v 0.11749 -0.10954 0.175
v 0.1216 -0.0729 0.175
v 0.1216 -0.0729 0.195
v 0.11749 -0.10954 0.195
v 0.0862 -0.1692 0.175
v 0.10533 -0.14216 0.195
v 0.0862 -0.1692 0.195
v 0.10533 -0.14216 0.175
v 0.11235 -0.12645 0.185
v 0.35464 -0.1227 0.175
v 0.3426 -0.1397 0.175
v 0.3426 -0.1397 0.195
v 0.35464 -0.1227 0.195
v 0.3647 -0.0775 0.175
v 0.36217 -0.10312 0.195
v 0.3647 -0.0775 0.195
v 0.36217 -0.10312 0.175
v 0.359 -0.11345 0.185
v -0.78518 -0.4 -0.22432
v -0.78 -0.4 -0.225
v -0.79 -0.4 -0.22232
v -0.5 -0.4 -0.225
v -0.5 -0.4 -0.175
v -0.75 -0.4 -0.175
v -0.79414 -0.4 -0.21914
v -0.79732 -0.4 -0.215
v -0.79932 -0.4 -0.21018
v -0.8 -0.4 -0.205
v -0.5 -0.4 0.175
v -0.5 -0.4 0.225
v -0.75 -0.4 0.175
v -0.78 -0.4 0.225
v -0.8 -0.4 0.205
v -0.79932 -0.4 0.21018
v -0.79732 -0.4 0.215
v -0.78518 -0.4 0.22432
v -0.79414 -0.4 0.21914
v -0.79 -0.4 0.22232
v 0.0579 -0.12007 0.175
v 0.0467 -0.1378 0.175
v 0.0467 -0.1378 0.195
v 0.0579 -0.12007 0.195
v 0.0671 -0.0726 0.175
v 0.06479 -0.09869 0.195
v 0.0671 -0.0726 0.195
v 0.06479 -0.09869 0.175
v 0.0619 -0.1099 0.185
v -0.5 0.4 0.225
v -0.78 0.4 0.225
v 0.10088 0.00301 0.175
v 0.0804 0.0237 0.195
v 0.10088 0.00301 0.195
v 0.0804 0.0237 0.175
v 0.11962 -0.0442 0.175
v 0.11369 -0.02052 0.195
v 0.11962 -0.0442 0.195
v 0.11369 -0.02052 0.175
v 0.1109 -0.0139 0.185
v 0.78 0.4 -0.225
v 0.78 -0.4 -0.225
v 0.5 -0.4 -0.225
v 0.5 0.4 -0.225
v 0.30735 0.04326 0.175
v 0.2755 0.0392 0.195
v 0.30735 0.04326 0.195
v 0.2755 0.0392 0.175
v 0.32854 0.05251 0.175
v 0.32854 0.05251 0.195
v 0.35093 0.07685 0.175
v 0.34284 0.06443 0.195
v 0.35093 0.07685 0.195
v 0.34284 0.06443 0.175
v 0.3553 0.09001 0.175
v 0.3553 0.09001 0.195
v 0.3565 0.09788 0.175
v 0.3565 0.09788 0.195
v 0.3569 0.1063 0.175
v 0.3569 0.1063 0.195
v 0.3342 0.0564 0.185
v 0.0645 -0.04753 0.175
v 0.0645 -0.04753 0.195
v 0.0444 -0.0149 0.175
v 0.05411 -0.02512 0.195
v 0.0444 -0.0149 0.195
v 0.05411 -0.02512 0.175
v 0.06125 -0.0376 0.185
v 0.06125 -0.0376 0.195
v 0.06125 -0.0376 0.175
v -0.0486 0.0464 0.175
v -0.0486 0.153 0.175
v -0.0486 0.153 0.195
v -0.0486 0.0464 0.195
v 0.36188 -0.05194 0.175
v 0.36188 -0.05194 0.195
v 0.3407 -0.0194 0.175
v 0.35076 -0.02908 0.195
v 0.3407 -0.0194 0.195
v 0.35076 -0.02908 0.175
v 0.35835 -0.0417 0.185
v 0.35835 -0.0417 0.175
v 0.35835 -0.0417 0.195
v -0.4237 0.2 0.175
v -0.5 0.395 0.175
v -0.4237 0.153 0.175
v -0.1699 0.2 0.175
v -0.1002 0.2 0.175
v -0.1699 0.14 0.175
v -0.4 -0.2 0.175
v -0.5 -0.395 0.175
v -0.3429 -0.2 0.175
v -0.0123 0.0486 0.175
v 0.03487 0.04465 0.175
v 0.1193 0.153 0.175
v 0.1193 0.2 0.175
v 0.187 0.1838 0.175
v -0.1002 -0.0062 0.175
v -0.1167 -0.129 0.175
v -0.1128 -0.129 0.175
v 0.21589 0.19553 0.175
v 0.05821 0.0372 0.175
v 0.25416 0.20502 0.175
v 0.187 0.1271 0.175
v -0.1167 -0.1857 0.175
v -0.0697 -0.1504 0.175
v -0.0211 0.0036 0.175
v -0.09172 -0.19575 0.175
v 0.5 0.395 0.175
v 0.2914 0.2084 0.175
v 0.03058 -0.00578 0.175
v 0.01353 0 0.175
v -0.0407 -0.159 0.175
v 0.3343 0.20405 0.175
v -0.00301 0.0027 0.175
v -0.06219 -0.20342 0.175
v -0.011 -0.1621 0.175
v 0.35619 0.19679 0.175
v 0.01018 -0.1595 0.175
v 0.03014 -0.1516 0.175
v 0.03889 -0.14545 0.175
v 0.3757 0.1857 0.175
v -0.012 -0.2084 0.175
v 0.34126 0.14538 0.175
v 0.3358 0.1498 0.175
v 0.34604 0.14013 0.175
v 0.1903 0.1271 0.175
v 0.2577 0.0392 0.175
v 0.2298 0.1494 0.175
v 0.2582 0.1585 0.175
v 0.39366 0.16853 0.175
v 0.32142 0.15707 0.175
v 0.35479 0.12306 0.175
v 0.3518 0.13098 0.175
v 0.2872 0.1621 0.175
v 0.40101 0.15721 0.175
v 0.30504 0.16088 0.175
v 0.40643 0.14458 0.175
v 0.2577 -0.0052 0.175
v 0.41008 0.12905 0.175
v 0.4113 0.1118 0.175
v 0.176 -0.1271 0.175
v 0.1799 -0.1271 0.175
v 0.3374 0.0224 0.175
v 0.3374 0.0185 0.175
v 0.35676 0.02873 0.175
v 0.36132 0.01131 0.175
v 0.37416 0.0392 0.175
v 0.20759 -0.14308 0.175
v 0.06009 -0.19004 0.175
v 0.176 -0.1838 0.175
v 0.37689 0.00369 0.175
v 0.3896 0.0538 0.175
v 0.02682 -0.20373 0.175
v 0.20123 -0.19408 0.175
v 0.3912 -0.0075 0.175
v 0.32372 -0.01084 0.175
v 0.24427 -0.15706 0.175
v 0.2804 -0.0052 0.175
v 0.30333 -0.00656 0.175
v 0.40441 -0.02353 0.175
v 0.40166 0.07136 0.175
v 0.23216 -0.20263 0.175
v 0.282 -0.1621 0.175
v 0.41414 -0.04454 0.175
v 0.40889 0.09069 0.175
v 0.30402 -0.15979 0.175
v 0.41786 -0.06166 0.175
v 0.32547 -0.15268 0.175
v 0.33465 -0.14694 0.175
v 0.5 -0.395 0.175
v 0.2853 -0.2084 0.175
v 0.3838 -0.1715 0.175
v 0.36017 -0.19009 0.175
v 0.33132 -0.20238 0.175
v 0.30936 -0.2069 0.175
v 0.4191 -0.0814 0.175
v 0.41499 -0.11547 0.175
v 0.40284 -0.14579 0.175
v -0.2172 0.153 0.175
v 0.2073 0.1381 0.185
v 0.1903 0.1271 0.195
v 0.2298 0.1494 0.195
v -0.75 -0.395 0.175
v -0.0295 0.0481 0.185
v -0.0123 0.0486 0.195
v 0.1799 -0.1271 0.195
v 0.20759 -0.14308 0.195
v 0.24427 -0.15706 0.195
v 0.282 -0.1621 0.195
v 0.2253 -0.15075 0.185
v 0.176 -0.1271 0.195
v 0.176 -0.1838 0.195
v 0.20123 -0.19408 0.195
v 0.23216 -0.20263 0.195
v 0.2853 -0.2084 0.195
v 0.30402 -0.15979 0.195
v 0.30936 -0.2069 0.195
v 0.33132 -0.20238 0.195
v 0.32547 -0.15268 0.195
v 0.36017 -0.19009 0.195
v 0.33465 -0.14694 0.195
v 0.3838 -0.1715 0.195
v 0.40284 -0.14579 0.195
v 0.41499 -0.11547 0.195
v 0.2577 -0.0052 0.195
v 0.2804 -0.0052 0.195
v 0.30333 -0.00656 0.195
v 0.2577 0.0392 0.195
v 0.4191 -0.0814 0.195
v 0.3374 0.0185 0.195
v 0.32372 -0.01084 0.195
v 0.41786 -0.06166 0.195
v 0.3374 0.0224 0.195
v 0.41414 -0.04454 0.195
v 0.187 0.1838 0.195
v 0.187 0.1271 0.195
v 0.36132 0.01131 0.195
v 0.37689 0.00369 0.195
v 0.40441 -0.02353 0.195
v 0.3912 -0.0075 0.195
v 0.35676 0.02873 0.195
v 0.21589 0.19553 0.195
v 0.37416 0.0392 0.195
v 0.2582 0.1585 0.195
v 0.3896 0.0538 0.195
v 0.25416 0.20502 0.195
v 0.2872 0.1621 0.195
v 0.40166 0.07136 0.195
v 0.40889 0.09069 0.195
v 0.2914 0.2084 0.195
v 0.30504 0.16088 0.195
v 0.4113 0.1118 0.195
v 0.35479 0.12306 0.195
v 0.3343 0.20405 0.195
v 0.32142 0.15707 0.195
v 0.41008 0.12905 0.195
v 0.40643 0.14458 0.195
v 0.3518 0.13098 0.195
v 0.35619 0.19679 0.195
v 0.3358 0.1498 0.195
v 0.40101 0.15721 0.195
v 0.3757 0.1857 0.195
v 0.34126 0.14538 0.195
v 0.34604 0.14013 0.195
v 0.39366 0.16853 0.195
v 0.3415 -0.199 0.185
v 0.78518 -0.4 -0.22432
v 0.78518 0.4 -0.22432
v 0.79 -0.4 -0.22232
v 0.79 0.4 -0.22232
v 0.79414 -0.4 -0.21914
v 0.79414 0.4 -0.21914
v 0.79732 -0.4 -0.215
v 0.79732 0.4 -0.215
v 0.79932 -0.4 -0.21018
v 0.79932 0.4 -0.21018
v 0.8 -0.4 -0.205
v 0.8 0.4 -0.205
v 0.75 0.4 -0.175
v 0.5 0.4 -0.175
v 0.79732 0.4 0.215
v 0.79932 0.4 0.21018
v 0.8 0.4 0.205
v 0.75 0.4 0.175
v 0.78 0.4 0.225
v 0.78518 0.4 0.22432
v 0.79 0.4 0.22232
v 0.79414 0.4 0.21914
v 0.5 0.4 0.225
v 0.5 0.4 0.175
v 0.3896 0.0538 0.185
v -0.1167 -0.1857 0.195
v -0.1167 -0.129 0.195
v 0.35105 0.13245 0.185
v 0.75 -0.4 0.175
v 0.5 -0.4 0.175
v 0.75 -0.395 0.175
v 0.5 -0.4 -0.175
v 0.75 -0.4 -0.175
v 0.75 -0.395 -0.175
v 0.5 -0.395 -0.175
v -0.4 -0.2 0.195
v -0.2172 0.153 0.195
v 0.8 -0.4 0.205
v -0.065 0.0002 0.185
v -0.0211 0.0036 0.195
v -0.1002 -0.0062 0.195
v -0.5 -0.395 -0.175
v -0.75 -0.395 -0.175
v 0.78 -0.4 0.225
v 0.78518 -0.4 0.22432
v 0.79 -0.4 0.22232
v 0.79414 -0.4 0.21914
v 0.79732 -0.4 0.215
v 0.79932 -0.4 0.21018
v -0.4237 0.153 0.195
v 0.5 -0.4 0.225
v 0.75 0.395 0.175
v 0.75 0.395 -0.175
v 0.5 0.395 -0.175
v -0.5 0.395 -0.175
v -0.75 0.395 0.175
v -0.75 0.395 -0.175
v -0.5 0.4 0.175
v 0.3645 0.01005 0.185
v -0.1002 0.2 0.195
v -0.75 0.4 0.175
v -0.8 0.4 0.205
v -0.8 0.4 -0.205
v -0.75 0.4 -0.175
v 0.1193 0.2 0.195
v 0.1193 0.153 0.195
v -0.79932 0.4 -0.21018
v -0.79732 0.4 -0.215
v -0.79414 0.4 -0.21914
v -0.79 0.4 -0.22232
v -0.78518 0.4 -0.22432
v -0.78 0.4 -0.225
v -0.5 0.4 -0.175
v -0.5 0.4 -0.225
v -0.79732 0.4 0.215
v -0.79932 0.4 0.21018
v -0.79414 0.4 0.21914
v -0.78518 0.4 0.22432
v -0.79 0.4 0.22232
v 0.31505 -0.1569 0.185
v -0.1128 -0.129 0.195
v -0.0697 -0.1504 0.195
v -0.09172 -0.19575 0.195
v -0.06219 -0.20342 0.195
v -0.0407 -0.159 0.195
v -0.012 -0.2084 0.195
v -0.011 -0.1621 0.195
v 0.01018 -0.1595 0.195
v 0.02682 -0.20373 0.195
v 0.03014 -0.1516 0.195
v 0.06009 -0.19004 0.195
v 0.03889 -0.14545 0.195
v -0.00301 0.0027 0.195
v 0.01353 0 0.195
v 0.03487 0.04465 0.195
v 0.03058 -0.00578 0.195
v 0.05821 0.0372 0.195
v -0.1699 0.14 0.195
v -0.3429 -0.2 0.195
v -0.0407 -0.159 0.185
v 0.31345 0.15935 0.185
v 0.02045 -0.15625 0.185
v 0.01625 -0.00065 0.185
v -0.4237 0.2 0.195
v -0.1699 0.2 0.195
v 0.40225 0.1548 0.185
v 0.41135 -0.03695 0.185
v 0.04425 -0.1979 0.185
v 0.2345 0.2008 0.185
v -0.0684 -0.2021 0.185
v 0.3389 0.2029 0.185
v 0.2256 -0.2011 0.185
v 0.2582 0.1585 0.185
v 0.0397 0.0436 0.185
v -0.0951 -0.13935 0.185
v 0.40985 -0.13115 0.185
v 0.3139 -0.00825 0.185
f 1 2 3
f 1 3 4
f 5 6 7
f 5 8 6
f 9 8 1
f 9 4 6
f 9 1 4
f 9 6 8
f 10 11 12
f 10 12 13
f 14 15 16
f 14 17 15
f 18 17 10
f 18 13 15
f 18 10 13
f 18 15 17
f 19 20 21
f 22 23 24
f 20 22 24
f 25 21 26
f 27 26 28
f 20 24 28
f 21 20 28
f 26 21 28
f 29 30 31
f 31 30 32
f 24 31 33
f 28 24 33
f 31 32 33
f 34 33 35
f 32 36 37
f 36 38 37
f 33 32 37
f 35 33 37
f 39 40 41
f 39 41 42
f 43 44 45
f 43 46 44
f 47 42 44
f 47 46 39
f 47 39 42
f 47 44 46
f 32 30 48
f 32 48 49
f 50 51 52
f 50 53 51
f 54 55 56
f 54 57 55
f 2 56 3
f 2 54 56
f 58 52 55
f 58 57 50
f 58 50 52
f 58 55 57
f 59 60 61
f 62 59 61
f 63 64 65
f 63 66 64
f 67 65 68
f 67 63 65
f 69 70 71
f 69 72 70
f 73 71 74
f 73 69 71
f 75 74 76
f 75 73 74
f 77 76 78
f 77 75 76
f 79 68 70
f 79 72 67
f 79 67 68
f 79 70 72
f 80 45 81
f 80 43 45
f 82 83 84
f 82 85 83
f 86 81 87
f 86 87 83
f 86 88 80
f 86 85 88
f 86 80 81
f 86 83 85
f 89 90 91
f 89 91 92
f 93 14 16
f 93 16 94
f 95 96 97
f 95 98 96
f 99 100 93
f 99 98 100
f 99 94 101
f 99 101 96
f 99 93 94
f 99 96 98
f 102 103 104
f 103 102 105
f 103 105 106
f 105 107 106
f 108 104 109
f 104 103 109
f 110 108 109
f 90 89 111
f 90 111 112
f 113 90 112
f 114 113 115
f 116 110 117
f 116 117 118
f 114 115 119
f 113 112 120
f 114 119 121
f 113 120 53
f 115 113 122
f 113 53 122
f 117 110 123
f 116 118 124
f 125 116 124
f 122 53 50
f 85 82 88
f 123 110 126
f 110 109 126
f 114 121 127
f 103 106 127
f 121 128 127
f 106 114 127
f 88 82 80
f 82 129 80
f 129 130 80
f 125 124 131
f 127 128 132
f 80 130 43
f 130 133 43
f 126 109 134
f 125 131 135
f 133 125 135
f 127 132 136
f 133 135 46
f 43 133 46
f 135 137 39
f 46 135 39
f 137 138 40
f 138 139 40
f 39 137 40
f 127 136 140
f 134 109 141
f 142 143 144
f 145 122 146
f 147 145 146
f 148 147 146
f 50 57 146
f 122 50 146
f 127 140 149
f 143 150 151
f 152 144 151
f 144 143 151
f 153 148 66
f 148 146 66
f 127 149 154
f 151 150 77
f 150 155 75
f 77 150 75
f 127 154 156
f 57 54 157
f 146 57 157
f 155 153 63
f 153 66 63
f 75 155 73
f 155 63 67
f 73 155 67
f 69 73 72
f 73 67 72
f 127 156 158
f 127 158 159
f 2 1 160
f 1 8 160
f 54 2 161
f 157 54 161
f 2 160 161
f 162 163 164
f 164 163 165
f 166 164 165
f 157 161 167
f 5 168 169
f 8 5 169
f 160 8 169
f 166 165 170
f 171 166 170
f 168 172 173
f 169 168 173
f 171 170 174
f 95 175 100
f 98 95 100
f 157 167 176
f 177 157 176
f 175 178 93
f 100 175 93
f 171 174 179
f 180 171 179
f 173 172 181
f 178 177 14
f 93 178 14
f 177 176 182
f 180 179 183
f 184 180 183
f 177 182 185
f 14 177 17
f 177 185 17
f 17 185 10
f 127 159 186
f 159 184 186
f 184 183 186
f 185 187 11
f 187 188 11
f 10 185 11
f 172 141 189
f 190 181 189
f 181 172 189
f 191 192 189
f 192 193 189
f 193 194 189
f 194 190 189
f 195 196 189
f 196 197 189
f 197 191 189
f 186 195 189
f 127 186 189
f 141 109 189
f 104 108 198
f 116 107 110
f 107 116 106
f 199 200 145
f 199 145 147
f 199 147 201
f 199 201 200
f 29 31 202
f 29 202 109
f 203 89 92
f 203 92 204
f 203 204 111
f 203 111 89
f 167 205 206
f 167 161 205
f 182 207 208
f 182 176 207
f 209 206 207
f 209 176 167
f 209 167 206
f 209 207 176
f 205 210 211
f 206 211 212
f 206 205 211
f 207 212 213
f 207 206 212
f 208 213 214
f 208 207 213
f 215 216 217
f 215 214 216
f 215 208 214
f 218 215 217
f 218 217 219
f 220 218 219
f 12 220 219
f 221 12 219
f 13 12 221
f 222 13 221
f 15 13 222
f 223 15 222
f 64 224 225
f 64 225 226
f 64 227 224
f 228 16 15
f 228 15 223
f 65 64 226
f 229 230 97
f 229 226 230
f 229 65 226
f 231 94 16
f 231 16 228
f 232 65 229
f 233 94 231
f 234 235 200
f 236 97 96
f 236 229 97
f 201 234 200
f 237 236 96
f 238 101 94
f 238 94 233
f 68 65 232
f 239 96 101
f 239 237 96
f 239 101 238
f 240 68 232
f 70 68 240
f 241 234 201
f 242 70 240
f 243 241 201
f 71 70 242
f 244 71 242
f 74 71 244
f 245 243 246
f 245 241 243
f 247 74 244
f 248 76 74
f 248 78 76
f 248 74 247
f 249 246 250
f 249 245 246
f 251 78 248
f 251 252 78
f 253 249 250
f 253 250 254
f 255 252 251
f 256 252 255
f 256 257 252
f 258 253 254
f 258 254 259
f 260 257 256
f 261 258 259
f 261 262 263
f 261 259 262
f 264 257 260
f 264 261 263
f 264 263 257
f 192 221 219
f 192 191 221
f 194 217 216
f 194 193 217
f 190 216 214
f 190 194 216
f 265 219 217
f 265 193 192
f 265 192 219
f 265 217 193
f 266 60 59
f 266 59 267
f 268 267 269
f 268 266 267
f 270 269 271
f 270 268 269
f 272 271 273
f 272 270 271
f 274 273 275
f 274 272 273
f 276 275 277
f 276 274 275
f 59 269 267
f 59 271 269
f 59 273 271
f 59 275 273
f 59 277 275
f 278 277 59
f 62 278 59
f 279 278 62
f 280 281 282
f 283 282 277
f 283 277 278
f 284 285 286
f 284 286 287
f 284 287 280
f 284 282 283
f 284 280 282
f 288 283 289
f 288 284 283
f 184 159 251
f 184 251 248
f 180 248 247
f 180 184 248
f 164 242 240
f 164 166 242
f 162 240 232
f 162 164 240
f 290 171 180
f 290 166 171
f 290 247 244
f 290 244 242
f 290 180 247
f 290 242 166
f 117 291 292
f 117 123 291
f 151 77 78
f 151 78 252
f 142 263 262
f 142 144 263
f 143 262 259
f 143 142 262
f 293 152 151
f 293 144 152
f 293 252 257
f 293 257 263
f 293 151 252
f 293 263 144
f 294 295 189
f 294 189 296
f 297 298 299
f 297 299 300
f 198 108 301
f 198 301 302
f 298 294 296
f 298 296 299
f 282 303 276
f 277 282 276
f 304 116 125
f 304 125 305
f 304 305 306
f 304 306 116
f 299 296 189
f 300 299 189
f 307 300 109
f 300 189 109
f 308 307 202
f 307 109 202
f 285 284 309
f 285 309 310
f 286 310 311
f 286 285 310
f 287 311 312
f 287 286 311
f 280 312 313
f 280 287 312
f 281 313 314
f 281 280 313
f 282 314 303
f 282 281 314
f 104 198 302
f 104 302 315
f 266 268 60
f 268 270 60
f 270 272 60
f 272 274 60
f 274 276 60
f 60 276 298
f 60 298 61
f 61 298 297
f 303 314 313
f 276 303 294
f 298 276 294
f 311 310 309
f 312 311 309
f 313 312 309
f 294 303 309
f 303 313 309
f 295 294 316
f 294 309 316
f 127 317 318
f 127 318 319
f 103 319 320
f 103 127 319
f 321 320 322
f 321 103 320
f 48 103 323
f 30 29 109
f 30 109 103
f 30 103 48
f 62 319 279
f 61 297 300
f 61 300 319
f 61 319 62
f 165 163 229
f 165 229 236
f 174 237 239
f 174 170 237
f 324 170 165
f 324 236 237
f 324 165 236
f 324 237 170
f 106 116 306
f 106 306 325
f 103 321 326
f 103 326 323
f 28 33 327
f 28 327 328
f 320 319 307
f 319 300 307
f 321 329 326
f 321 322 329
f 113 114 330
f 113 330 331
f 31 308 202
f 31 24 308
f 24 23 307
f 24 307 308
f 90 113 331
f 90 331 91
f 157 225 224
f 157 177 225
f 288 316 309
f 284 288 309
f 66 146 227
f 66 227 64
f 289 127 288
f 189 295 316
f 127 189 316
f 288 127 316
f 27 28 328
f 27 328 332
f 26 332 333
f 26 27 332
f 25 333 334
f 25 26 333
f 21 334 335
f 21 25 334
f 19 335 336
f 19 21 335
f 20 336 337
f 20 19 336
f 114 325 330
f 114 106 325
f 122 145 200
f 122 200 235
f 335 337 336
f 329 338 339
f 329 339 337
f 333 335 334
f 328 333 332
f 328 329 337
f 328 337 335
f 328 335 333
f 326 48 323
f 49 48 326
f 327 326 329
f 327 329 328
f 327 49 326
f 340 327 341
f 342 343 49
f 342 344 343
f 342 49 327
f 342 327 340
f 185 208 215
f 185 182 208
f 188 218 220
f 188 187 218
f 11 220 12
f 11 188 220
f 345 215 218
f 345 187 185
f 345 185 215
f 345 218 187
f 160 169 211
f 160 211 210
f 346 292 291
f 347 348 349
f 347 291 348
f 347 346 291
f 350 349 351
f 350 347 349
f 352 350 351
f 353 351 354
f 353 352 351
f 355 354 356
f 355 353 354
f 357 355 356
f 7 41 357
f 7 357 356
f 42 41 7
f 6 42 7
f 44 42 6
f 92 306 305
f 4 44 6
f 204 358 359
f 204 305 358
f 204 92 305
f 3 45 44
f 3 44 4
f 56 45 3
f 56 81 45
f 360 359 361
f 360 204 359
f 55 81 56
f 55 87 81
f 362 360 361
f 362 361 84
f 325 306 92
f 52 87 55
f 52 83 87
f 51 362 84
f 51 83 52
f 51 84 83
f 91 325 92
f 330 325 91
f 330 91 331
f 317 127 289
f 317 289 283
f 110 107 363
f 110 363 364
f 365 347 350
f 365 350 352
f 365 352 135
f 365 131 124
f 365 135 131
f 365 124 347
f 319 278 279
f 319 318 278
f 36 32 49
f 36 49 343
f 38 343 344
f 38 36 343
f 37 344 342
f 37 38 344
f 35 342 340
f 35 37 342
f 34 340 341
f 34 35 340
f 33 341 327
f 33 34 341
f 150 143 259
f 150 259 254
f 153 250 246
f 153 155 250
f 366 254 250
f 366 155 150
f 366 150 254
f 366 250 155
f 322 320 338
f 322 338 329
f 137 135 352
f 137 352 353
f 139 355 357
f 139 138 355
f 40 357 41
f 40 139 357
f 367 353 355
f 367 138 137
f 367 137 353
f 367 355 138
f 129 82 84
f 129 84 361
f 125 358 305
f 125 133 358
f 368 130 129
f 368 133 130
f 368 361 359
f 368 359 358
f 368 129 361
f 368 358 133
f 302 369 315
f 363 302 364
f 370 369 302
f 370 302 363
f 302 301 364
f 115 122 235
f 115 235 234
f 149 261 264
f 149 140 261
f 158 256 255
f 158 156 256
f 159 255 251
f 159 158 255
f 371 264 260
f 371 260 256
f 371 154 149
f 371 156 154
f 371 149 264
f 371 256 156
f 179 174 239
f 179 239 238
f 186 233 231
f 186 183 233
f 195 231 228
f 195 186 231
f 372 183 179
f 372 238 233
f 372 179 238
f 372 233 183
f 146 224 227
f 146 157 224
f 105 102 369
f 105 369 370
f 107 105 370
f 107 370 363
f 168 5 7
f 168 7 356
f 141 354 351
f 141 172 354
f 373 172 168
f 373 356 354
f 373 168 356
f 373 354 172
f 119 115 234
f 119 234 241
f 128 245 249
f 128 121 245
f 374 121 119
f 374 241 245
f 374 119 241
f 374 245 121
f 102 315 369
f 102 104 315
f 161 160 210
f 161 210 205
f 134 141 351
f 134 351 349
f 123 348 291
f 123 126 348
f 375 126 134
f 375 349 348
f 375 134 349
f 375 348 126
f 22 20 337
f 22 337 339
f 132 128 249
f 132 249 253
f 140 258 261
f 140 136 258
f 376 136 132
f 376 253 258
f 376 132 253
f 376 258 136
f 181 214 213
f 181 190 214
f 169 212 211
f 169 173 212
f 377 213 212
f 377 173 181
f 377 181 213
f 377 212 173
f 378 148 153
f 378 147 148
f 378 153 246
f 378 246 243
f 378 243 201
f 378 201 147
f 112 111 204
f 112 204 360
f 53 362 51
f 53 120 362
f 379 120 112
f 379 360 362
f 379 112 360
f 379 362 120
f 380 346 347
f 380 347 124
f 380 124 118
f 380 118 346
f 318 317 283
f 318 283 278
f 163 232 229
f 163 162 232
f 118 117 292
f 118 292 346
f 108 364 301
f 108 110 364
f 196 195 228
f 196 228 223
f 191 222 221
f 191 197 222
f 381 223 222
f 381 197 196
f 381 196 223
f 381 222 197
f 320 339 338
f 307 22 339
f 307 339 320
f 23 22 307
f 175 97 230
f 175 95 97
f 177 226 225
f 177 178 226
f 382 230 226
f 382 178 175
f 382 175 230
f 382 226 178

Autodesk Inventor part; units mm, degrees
ref_plane "YZ Plane" through (0, 0, 0) normal (1, 0, 0) x (0, 1, 0)
ref_plane "XZ Plane" through (0, 0, 0) normal (0, 1, 0) x (-1, 0, 0)
ref_plane "XY Plane" through (0, 0, 0) normal (0, 0, 1) x (1, 0, 0)
sketch "Sketch1" plane through (0, 0, 0) normal (0, 1, 0) x (-1, 0, 0)
  line L0 (0.75, 0.175) -> (-0.75, 0.175)
  line L1 (-0.75, 0.175) -> (-0.75, -0.175)
  line L2 (-0.75, -0.175) -> (0.75, -0.175)
  line L3 (0.75, -0.175) -> (0.75, 0.175)
  line L4 (0.5, 0.175) -> (0.5, 0.225)
  line L5 (0.5, 0.225) -> (0.8, 0.225)
  line L6 (0.8, 0.225) -> (0.8, -0.225)
  line L7 (0.8, -0.225) -> (0.5, -0.225)
  line L8 (0.5, -0.225) -> (0.5, -0.175)
  line L9 (-0.5, 0.175) -> (-0.5, 0.225)
  line L10 (-0.5, 0.225) -> (-0.8, 0.225)
  line L11 (-0.8, 0.225) -> (-0.8, -0.225)
  line L12 (-0.8, -0.225) -> (-0.5, -0.225)
  line L13 (-0.5, -0.175) -> (-0.5, -0.225)
  line L14 (0.5, 0.175) -> (-0.5, 0.175)
  point P0 (0, 0)
  point P1 (0, 0.175)
  point P2 (0.75, 0)
  dimension "d0" = 1.6
  dimension "d1" = 0.05
  dimension "d2" = 0.05
  dimension "d3" = 0.45
  dimension "d4" = 0.3
extrude "Extrusion1" add sketch "Sketch1" along normal mid plane 0.8 contours L0 L4 L5 L6 L7 L8 L2 L3 | L0 L1 L2 L13 L12 L11 L10 L9
extrude "Extrusion2" add sketch "Sketch1" along normal mid plane 0.79 contours L3 L2 L1 L0
sketch "Sketch2" plane through (-0.5, -0.395, 0.175) normal (0, 0, 1) x (1, 0, 0)
  line L0 (0, 0) -> (0, 0.79) projected
  line L1 (1, 0) -> (0, 0) projected
  line L2 (1, 0) -> (1, 0.79) projected
  line L3 (0, 0.79) -> (1, 0.79) projected
  line L4 (0, 0.395) -> (1, 0.395) construction
  line L5 (0.3301, 0.535) -> (0.1571, 0.195)
  line L6 (0.1571, 0.195) -> (0.1, 0.195)
  line L7 (0.1, 0.195) -> (0.2828, 0.548)
  line L8 (0.2828, 0.548) -> (0.0763, 0.548)
  line L9 (0.0763, 0.548) -> (0.0763, 0.595)
  line L10 (0.0763, 0.595) -> (0.3301, 0.595)
  line L11 (0.3301, 0.595) -> (0.3301, 0.535)
  spline S0 degree 2 poles (0.6216, 0.3221) (0.6216, 0.2932) (0.6031, 0.2439) (0.5862, 0.2258) knots 0 0 0 1 2 2 2
  spline S1 degree 2 poles (0.5862, 0.2258) (0.5694, 0.2076) (0.5191, 0.1866) (0.488, 0.1866) knots 0 0 0 1 2 2 2
  spline S2 degree 2 poles (0.488, 0.1866) (0.4595, 0.1866) (0.4037, 0.1992) (0.3833, 0.2093) knots 0 0 0 1 2 2 2
  line L12 (0.3833, 0.2093) -> (0.3833, 0.266)
  line L13 (0.3833, 0.266) -> (0.3872, 0.266)
  spline S3 degree 2 poles (0.3872, 0.266) (0.3934, 0.2615) (0.4164, 0.2498) (0.4303, 0.2446) knots 0 0 0 1 2 2 2
  spline S4 degree 2 poles (0.4303, 0.2446) (0.4462, 0.2391) (0.4724, 0.2329) (0.489, 0.2329) knots 0 0 0 1 2 2 2
  spline S5 degree 2 poles (0.489, 0.2329) (0.5052, 0.2329) (0.5357, 0.2446) (0.5467, 0.2572) knots 0 0 0 1 2 2 2
  spline S6 degree 2 poles (0.5467, 0.2572) (0.5567, 0.2692) (0.5671, 0.301) (0.5671, 0.3224) knots 0 0 0 1 2 2 2
  spline S7 degree 2 poles (0.5671, 0.3224) (0.5671, 0.3438) (0.5554, 0.371) (0.5444, 0.3801) knots 0 0 0 1 2 2 2
  spline S8 degree 2 poles (0.5444, 0.3801) (0.5331, 0.3901) (0.4994, 0.3986) (0.4789, 0.3986) knots 0 0 0 1 2 2 2
  spline S9 degree 2 poles (0.4789, 0.3986) (0.4569, 0.3986) (0.4131, 0.3918) (0.3998, 0.3888) knots 0 0 0 1 2 2 2
  line L14 (0.3998, 0.3888) -> (0.3998, 0.595)
  line L15 (0.3998, 0.595) -> (0.6193, 0.595)
  line L16 (0.6193, 0.595) -> (0.6193, 0.548)
  line L17 (0.6193, 0.548) -> (0.4514, 0.548)
  line L18 (0.4514, 0.548) -> (0.4514, 0.4414)
  spline S10 degree 2 poles (0.4514, 0.4414) (0.4611, 0.4426) (0.4799, 0.4436) (0.4877, 0.4436) knots 0 0 0 1 2 2 2
  spline S11 degree 2 poles (0.4877, 0.4436) (0.5185, 0.4436) (0.5609, 0.4336) (0.5804, 0.4187) knots 0 0 0 1 2 2 2
  spline S12 degree 2 poles (0.5804, 0.4187) (0.6002, 0.4038) (0.6216, 0.3584) (0.6216, 0.3221) knots 0 0 0 1 2 2 2
  spline S13 degree 2 poles (0.7872, 0.5571) (0.7726, 0.5571) (0.7438, 0.5499) (0.7298, 0.5444) knots 0 0 0 1 2 2 2
  spline S14 degree 2 poles (0.7298, 0.5444) (0.7169, 0.5389) (0.6977, 0.5273) (0.6903, 0.5221) knots 0 0 0 1 2 2 2
  line L19 (0.6903, 0.5221) -> (0.687, 0.5221)
  line L20 (0.687, 0.5221) -> (0.687, 0.5788)
  spline S15 degree 2 poles (0.687, 0.5788) (0.7045, 0.5882) (0.7645, 0.6034) (0.7914, 0.6034) knots 0 0 0 1 2 2 2
  spline S16 degree 2 poles (0.7914, 0.6034) (0.8186, 0.6034) (0.8592, 0.5924) (0.8757, 0.5807) knots 0 0 0 1 2 2 2
  spline S17 degree 2 poles (0.8757, 0.5807) (0.8932, 0.5681) (0.9113, 0.5315) (0.9113, 0.5068) knots 0 0 0 1 2 2 2
  spline S18 degree 2 poles (0.9113, 0.5068) (0.9113, 0.4738) (0.8679, 0.4238) (0.8374, 0.4174) knots 0 0 0 1 2 2 2
  line L21 (0.8374, 0.4174) -> (0.8374, 0.4135)
  spline S19 degree 2 poles (0.8374, 0.4135) (0.8501, 0.4109) (0.8789, 0.3992) (0.8912, 0.3875) knots 0 0 0 1 2 2 2
  spline S20 degree 2 poles (0.8912, 0.3875) (0.9036, 0.3762) (0.9191, 0.3399) (0.9191, 0.3136) knots 0 0 0 1 2 2 2
  spline S21 degree 2 poles (0.9191, 0.3136) (0.9191, 0.2867) (0.9006, 0.241) (0.8838, 0.2235) knots 0 0 0 1 2 2 2
  spline S22 degree 2 poles (0.8838, 0.2235) (0.8663, 0.2054) (0.8167, 0.1866) (0.7853, 0.1866) knots 0 0 0 1 2 2 2
  spline S23 degree 2 poles (0.7853, 0.1866) (0.7551, 0.1866) (0.6961, 0.2012) (0.676, 0.2112) knots 0 0 0 1 2 2 2
  line L22 (0.676, 0.2112) -> (0.676, 0.2679)
  line L23 (0.676, 0.2679) -> (0.6799, 0.2679)
  spline S24 degree 2 poles (0.6799, 0.2679) (0.6968, 0.2556) (0.7538, 0.2329) (0.782, 0.2329) knots 0 0 0 1 2 2 2
  spline S25 degree 2 poles (0.782, 0.2329) (0.7985, 0.2329) (0.8316, 0.2433) (0.8426, 0.2553) knots 0 0 0 1 2 2 2
  spline S26 degree 2 poles (0.8426, 0.2553) (0.8533, 0.2673) (0.8647, 0.2958) (0.8647, 0.3175) knots 0 0 0 1 2 2 2
  spline S27 degree 2 poles (0.8647, 0.3175) (0.8647, 0.3392) (0.852, 0.3674) (0.8407, 0.3756) knots 0 0 0 1 2 2 2
  spline S28 degree 2 poles (0.8407, 0.3756) (0.8293, 0.3837) (0.7985, 0.3898) (0.7804, 0.3898) knots 0 0 0 1 2 2 2
  line L24 (0.7804, 0.3898) -> (0.7577, 0.3898)
  line L25 (0.7577, 0.3898) -> (0.7577, 0.4342)
  line L26 (0.7577, 0.4342) -> (0.7755, 0.4342)
  spline S29 degree 2 poles (0.7755, 0.4342) (0.8115, 0.4342) (0.8569, 0.4686) (0.8569, 0.5013) knots 0 0 0 1 2 2 2
  spline S30 degree 2 poles (0.8569, 0.5013) (0.8569, 0.5166) (0.8452, 0.5383) (0.8358, 0.5448) knots 0 0 0 1 2 2 2
  spline S31 degree 2 poles (0.8358, 0.5448) (0.8258, 0.5516) (0.8011, 0.5571) (0.7872, 0.5571) knots 0 0 0 1 2 2 2
  point P0 (0.5, 0.395)
extrude "Extrusion3" add sketch "Sketch2" along normal blind 0.02 contours L5 L6 L7 L8 L9 L10 L11 | S0 S1 S2 L12 L13 S3 S4 S5 S6 S7 S8 S9 L14 L15 L16 L17 L18 S10 S11 S12 | S13 S14 L19 L20 S15 S16 S17 S18 L21 S19 S20 S21 S22 S23 L22 L23 S24 S25 S26 S27 S28 L24 L25 L26 S29 S30 S31
fillet "Fillet1" radius 0.02 4 edges at (-0.8, 0, 0.225) (-0.8, 0, -0.225) (0.8, 0, 0.225) (0.8, 0, -0.225)
equation "\"d2\" = d1"
properties part number "21-1001" material "Copper"
